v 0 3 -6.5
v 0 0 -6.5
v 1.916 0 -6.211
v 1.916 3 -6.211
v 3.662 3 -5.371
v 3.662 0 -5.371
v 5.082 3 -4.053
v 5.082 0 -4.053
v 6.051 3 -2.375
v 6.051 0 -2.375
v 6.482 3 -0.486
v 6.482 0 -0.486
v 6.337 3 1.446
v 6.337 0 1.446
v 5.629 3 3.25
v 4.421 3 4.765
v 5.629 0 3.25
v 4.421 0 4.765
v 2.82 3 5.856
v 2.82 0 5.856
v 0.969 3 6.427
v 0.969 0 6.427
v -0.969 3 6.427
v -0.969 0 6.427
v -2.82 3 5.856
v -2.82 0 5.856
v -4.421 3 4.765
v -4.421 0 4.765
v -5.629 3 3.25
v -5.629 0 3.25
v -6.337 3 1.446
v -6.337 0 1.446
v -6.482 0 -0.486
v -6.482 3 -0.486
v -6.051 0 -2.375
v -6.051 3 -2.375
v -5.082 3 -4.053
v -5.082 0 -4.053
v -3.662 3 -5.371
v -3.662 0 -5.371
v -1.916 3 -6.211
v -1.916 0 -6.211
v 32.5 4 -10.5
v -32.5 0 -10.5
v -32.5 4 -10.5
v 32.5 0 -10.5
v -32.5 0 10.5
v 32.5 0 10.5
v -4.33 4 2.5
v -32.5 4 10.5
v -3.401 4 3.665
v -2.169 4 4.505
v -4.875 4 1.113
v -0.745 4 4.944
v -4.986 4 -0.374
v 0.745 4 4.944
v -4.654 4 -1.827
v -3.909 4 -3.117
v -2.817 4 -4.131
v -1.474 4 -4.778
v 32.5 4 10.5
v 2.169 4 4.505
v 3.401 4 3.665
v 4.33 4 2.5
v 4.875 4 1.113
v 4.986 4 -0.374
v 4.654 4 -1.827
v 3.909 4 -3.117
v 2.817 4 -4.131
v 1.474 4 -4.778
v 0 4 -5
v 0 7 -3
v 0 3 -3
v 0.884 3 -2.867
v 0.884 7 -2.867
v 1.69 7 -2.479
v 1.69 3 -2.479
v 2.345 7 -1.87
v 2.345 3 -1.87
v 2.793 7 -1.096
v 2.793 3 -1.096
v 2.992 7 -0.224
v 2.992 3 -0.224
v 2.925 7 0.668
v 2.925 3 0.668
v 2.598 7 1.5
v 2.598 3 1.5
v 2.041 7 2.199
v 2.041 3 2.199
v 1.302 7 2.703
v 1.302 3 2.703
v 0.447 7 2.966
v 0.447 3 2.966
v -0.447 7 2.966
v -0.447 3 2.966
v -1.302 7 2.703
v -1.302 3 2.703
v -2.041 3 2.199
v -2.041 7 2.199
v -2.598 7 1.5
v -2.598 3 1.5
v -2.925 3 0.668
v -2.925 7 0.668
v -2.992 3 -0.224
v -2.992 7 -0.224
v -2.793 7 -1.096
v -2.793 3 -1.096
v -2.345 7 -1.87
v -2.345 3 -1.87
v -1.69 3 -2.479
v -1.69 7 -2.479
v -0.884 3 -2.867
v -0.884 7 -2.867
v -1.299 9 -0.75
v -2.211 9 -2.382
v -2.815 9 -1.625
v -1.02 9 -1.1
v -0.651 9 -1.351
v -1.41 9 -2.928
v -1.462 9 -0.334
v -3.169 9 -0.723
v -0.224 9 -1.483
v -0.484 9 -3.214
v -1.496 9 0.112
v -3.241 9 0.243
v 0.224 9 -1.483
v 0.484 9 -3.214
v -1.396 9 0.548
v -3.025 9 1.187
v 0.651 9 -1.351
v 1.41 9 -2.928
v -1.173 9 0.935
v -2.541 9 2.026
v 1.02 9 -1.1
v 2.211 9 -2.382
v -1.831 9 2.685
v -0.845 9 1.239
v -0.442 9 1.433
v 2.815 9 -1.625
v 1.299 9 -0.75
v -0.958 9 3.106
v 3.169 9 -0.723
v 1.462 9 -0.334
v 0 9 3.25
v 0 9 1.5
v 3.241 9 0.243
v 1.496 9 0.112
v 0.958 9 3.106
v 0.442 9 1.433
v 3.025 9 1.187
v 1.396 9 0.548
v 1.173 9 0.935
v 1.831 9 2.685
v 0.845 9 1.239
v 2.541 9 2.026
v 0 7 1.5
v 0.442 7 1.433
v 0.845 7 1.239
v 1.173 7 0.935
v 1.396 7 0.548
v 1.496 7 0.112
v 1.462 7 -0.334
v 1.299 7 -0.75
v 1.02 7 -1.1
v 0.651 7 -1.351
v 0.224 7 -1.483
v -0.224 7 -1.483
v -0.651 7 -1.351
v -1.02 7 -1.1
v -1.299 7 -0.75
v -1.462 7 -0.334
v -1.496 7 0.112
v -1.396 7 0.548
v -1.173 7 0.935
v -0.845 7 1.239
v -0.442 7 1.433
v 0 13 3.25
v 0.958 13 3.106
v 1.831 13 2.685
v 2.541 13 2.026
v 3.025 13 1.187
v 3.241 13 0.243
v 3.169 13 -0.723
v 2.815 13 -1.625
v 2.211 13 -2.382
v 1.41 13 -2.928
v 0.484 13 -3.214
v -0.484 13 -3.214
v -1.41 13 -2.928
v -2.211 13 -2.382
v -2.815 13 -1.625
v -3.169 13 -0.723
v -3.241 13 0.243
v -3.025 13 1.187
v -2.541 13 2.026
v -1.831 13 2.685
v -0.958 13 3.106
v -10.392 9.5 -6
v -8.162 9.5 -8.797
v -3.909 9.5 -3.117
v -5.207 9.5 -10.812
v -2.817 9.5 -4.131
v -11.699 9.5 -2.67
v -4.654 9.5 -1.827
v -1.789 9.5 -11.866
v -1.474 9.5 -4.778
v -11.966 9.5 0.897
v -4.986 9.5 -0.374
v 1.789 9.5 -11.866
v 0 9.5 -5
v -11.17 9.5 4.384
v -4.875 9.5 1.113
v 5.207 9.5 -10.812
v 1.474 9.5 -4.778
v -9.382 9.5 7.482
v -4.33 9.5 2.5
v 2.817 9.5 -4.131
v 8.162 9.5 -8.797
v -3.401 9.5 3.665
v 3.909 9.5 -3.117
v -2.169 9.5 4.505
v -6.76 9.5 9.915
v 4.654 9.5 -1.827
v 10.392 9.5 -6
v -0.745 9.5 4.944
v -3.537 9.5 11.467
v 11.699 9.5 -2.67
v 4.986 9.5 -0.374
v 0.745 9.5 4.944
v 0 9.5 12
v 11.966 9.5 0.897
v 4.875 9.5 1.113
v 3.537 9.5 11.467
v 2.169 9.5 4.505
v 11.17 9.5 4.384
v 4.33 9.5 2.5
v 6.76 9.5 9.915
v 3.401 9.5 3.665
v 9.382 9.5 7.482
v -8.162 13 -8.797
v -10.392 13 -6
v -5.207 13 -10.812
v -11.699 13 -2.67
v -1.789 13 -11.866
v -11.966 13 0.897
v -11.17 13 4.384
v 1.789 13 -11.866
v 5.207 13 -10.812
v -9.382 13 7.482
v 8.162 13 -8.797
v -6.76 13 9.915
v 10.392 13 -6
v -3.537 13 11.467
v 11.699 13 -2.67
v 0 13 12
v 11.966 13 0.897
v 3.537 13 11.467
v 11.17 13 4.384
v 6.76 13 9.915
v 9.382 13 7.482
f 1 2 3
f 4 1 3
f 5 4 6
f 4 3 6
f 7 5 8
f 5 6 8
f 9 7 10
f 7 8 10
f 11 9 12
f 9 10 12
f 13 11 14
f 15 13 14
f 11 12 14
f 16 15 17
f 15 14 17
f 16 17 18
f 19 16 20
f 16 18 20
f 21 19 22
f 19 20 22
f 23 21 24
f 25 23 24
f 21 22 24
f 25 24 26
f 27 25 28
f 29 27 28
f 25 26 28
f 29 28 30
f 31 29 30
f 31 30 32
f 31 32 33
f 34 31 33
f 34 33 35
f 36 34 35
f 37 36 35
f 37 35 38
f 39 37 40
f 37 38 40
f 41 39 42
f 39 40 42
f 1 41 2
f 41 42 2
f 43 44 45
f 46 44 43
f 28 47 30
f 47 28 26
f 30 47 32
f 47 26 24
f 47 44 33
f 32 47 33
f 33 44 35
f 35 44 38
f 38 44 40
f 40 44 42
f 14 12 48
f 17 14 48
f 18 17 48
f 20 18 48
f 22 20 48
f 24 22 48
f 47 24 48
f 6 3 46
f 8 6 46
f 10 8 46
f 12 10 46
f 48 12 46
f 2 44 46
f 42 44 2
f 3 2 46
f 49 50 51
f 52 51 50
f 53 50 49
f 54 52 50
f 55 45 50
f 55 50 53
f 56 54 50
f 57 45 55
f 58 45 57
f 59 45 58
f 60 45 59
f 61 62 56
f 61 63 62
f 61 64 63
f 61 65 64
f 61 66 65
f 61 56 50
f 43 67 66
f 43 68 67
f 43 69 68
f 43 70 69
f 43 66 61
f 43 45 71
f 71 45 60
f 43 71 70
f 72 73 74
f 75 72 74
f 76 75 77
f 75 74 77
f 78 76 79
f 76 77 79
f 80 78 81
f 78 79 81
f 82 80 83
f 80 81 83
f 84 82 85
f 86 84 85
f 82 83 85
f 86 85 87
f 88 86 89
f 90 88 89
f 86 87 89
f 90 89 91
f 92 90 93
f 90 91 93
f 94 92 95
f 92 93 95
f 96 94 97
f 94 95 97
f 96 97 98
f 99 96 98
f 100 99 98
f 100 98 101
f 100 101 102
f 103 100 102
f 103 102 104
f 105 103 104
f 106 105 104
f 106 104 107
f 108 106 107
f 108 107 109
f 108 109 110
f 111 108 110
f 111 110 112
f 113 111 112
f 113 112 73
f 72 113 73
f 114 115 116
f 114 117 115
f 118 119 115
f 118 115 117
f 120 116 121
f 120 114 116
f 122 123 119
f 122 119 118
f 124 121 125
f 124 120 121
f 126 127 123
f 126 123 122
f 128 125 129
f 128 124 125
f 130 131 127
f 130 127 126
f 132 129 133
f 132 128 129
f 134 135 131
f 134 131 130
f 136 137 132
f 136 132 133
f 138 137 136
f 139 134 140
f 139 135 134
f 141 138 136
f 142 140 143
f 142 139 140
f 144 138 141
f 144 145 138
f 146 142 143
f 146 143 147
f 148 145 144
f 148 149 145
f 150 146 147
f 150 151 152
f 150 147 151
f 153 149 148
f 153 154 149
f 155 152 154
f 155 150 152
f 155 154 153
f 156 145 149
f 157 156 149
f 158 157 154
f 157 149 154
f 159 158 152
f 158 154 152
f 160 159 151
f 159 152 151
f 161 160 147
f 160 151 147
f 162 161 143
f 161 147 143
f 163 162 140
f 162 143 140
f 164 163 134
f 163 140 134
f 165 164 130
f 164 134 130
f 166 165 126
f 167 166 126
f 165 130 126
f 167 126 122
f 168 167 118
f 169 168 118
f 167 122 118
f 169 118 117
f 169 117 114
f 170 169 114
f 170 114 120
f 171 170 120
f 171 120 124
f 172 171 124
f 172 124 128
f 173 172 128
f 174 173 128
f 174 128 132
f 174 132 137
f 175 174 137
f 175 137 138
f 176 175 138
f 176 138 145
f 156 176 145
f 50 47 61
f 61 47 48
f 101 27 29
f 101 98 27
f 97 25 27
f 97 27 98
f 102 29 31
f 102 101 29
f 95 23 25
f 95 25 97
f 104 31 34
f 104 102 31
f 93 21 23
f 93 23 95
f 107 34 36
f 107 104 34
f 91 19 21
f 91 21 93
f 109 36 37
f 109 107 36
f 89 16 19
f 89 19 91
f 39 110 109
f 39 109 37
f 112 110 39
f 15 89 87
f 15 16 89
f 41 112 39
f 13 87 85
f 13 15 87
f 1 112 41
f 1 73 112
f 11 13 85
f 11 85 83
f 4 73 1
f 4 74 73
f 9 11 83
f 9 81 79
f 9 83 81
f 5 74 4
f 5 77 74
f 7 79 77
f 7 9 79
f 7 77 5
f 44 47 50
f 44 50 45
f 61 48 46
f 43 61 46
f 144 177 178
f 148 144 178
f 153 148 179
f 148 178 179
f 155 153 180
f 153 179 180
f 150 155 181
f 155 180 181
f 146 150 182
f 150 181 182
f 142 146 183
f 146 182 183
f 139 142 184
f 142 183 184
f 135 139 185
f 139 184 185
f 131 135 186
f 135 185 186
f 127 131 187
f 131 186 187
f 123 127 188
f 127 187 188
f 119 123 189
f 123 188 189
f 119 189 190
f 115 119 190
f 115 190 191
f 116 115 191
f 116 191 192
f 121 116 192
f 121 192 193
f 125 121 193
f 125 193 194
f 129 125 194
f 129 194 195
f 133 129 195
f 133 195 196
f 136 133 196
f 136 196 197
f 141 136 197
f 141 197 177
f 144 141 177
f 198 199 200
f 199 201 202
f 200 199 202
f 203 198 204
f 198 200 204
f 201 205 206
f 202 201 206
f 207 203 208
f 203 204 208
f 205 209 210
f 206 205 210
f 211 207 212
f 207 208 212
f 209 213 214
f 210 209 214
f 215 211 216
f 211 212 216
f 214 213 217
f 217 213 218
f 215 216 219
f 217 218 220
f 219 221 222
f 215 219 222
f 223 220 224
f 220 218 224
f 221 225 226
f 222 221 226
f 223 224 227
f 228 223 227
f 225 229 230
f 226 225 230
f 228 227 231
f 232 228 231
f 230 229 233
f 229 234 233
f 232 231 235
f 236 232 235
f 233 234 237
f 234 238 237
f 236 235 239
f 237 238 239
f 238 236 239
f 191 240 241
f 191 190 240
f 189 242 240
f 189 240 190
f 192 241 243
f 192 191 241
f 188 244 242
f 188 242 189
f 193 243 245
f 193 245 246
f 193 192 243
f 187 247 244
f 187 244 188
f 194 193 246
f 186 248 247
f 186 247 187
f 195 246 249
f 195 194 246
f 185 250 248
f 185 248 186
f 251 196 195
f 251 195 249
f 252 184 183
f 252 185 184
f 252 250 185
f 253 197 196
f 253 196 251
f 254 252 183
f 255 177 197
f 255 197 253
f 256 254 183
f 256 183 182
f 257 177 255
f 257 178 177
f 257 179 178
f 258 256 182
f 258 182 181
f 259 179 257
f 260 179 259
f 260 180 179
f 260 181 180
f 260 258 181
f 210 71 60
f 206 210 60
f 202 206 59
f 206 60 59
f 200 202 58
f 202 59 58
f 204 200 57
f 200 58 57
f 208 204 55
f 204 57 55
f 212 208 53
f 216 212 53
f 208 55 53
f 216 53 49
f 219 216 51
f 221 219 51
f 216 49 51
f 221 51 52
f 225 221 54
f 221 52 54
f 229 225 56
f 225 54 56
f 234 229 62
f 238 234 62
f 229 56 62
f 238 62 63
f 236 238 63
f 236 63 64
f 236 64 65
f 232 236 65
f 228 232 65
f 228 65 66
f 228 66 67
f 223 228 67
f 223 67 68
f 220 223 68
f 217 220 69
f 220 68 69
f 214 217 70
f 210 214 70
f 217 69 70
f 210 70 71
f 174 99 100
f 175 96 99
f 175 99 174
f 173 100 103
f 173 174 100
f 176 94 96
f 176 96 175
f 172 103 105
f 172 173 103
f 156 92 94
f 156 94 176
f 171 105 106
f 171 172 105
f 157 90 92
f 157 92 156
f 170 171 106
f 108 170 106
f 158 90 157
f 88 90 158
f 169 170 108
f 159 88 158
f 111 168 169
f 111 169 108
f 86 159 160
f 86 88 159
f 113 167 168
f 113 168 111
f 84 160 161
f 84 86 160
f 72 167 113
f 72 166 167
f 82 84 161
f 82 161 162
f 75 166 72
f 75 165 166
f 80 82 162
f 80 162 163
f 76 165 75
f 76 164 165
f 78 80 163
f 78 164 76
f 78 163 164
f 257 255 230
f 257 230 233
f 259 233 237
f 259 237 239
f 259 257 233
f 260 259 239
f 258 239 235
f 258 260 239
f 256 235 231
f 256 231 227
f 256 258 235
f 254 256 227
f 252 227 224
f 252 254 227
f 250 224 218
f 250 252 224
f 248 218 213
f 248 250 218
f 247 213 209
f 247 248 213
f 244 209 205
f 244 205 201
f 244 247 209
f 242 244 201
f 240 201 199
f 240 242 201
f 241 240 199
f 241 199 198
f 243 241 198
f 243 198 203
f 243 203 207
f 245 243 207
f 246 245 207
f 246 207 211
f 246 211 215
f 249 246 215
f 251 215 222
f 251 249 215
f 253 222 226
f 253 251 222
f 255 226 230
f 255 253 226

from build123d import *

# Parameters (mm, degrees)
ESBO_O1_W                = 65
ESBO_O1_H                = 21
RESSALTO_EXTRUS_O3_DEPTH = 4
ESBO_O5_R                = 6.5
CORTE_EXTRUS_O2_DEPTH    = 3
ESBO_O6_R                = 3
CORTE_EXTRUS_O3_DEPTH    = 4
ESBO_O7_R                = 5
RESSALTO_EXTRUS_O4_DEPTH = 5.5
ESBO_O8_R                = 3.25
CORTE_EXTRUS_O4_DEPTH    = 0.5
ESBO_O10_R               = 3
CORTE_EXTRUS_O5_DEPTH    = 3
RESSALTO_EXTRUS_O5_START = 3.5
ESBO_O11_R               = 12
ESBO_O11_R_2             = 3.25
RESSALTO_EXTRUS_O5_DEPTH = 3.5
ESBO_O12_R               = 1.5
CORTE_EXTRUS_O6_DEPTH    = 5


with BuildPart() as part:
    # Esboço1 → Ressalto-extrusão3 (new body)
    with BuildSketch(Plane(origin=(0, 0, 0), x_dir=(1, 0, 0), z_dir=(0, 1, 0))):
        Rectangle(ESBO_O1_W, ESBO_O1_H)
    extrude(amount=RESSALTO_EXTRUS_O3_DEPTH)

    # Esboço5 → Corte-extrusão2 (cut)
    with BuildSketch(Plane.XZ):
        with Locations(Location((0, 0, 0), (0, 0, 270))):
            Circle(ESBO_O5_R)
    extrude(amount=-CORTE_EXTRUS_O2_DEPTH, mode=Mode.SUBTRACT)

    # Esboço6 → Corte-extrusão3 (cut)
    with BuildSketch(Plane.XZ.offset(-3)):
        with Locations(Location((0, 0, 0), (0, 0, 270))):
            Circle(ESBO_O6_R)
    extrude(amount=-CORTE_EXTRUS_O3_DEPTH, mode=Mode.SUBTRACT)

    # Esboço7 → Ressalto-extrusão4 (add)
    with BuildSketch(Plane(origin=(0, 4, 0), x_dir=(1, 0, 0), z_dir=(0, 1, 0))):
        with Locations(Location((0, 0, 0), (0, 0, 90))):
            Circle(ESBO_O7_R)
    extrude(amount=RESSALTO_EXTRUS_O4_DEPTH)

    # Esboço8 → Corte-extrusão4 (cut)
    with BuildSketch(Plane(origin=(0, 9.5, 0), x_dir=(1, 0, 0), z_dir=(0, 1, 0))):
        with Locations(Location((0, 0, 0), (0, 0, 270))):
            Circle(ESBO_O8_R)
    extrude(amount=-CORTE_EXTRUS_O4_DEPTH, mode=Mode.SUBTRACT)

    # Esboço10 → Corte-extrusão5 (cut)
    with BuildSketch(Plane.XZ.offset(-4)):
        with Locations(Location((0, 0, 0), (0, 0, 270))):
            Circle(ESBO_O10_R)
    extrude(amount=-CORTE_EXTRUS_O5_DEPTH, mode=Mode.SUBTRACT)

    # Esboço11 → Ressalto-extrusão5 (add)
    with BuildSketch(Plane(origin=(0, 9.5, 0), x_dir=(1, 0, 0), z_dir=(0, 1, 0)).offset(RESSALTO_EXTRUS_O5_START)):
        with Locations(Location((0, 0, 0), (0, 0, 270))):
            Circle(ESBO_O11_R)
        with Locations(Location((0, 0, 0), (0, 0, 270))):
            Circle(ESBO_O11_R_2, mode=Mode.SUBTRACT)
    extrude(amount=-RESSALTO_EXTRUS_O5_DEPTH)

    # Esboço12 → Corte-extrusão6 (cut)
    with BuildSketch(Plane(origin=(0, 9, 0), x_dir=(1, 0, 0), z_dir=(0, 1, 0))):
        with Locations(Location((0, 0, 0), (0, 0, 270))):
            Circle(ESBO_O12_R)
    extrude(amount=-CORTE_EXTRUS_O6_DEPTH, mode=Mode.SUBTRACT)


solid = part.part
